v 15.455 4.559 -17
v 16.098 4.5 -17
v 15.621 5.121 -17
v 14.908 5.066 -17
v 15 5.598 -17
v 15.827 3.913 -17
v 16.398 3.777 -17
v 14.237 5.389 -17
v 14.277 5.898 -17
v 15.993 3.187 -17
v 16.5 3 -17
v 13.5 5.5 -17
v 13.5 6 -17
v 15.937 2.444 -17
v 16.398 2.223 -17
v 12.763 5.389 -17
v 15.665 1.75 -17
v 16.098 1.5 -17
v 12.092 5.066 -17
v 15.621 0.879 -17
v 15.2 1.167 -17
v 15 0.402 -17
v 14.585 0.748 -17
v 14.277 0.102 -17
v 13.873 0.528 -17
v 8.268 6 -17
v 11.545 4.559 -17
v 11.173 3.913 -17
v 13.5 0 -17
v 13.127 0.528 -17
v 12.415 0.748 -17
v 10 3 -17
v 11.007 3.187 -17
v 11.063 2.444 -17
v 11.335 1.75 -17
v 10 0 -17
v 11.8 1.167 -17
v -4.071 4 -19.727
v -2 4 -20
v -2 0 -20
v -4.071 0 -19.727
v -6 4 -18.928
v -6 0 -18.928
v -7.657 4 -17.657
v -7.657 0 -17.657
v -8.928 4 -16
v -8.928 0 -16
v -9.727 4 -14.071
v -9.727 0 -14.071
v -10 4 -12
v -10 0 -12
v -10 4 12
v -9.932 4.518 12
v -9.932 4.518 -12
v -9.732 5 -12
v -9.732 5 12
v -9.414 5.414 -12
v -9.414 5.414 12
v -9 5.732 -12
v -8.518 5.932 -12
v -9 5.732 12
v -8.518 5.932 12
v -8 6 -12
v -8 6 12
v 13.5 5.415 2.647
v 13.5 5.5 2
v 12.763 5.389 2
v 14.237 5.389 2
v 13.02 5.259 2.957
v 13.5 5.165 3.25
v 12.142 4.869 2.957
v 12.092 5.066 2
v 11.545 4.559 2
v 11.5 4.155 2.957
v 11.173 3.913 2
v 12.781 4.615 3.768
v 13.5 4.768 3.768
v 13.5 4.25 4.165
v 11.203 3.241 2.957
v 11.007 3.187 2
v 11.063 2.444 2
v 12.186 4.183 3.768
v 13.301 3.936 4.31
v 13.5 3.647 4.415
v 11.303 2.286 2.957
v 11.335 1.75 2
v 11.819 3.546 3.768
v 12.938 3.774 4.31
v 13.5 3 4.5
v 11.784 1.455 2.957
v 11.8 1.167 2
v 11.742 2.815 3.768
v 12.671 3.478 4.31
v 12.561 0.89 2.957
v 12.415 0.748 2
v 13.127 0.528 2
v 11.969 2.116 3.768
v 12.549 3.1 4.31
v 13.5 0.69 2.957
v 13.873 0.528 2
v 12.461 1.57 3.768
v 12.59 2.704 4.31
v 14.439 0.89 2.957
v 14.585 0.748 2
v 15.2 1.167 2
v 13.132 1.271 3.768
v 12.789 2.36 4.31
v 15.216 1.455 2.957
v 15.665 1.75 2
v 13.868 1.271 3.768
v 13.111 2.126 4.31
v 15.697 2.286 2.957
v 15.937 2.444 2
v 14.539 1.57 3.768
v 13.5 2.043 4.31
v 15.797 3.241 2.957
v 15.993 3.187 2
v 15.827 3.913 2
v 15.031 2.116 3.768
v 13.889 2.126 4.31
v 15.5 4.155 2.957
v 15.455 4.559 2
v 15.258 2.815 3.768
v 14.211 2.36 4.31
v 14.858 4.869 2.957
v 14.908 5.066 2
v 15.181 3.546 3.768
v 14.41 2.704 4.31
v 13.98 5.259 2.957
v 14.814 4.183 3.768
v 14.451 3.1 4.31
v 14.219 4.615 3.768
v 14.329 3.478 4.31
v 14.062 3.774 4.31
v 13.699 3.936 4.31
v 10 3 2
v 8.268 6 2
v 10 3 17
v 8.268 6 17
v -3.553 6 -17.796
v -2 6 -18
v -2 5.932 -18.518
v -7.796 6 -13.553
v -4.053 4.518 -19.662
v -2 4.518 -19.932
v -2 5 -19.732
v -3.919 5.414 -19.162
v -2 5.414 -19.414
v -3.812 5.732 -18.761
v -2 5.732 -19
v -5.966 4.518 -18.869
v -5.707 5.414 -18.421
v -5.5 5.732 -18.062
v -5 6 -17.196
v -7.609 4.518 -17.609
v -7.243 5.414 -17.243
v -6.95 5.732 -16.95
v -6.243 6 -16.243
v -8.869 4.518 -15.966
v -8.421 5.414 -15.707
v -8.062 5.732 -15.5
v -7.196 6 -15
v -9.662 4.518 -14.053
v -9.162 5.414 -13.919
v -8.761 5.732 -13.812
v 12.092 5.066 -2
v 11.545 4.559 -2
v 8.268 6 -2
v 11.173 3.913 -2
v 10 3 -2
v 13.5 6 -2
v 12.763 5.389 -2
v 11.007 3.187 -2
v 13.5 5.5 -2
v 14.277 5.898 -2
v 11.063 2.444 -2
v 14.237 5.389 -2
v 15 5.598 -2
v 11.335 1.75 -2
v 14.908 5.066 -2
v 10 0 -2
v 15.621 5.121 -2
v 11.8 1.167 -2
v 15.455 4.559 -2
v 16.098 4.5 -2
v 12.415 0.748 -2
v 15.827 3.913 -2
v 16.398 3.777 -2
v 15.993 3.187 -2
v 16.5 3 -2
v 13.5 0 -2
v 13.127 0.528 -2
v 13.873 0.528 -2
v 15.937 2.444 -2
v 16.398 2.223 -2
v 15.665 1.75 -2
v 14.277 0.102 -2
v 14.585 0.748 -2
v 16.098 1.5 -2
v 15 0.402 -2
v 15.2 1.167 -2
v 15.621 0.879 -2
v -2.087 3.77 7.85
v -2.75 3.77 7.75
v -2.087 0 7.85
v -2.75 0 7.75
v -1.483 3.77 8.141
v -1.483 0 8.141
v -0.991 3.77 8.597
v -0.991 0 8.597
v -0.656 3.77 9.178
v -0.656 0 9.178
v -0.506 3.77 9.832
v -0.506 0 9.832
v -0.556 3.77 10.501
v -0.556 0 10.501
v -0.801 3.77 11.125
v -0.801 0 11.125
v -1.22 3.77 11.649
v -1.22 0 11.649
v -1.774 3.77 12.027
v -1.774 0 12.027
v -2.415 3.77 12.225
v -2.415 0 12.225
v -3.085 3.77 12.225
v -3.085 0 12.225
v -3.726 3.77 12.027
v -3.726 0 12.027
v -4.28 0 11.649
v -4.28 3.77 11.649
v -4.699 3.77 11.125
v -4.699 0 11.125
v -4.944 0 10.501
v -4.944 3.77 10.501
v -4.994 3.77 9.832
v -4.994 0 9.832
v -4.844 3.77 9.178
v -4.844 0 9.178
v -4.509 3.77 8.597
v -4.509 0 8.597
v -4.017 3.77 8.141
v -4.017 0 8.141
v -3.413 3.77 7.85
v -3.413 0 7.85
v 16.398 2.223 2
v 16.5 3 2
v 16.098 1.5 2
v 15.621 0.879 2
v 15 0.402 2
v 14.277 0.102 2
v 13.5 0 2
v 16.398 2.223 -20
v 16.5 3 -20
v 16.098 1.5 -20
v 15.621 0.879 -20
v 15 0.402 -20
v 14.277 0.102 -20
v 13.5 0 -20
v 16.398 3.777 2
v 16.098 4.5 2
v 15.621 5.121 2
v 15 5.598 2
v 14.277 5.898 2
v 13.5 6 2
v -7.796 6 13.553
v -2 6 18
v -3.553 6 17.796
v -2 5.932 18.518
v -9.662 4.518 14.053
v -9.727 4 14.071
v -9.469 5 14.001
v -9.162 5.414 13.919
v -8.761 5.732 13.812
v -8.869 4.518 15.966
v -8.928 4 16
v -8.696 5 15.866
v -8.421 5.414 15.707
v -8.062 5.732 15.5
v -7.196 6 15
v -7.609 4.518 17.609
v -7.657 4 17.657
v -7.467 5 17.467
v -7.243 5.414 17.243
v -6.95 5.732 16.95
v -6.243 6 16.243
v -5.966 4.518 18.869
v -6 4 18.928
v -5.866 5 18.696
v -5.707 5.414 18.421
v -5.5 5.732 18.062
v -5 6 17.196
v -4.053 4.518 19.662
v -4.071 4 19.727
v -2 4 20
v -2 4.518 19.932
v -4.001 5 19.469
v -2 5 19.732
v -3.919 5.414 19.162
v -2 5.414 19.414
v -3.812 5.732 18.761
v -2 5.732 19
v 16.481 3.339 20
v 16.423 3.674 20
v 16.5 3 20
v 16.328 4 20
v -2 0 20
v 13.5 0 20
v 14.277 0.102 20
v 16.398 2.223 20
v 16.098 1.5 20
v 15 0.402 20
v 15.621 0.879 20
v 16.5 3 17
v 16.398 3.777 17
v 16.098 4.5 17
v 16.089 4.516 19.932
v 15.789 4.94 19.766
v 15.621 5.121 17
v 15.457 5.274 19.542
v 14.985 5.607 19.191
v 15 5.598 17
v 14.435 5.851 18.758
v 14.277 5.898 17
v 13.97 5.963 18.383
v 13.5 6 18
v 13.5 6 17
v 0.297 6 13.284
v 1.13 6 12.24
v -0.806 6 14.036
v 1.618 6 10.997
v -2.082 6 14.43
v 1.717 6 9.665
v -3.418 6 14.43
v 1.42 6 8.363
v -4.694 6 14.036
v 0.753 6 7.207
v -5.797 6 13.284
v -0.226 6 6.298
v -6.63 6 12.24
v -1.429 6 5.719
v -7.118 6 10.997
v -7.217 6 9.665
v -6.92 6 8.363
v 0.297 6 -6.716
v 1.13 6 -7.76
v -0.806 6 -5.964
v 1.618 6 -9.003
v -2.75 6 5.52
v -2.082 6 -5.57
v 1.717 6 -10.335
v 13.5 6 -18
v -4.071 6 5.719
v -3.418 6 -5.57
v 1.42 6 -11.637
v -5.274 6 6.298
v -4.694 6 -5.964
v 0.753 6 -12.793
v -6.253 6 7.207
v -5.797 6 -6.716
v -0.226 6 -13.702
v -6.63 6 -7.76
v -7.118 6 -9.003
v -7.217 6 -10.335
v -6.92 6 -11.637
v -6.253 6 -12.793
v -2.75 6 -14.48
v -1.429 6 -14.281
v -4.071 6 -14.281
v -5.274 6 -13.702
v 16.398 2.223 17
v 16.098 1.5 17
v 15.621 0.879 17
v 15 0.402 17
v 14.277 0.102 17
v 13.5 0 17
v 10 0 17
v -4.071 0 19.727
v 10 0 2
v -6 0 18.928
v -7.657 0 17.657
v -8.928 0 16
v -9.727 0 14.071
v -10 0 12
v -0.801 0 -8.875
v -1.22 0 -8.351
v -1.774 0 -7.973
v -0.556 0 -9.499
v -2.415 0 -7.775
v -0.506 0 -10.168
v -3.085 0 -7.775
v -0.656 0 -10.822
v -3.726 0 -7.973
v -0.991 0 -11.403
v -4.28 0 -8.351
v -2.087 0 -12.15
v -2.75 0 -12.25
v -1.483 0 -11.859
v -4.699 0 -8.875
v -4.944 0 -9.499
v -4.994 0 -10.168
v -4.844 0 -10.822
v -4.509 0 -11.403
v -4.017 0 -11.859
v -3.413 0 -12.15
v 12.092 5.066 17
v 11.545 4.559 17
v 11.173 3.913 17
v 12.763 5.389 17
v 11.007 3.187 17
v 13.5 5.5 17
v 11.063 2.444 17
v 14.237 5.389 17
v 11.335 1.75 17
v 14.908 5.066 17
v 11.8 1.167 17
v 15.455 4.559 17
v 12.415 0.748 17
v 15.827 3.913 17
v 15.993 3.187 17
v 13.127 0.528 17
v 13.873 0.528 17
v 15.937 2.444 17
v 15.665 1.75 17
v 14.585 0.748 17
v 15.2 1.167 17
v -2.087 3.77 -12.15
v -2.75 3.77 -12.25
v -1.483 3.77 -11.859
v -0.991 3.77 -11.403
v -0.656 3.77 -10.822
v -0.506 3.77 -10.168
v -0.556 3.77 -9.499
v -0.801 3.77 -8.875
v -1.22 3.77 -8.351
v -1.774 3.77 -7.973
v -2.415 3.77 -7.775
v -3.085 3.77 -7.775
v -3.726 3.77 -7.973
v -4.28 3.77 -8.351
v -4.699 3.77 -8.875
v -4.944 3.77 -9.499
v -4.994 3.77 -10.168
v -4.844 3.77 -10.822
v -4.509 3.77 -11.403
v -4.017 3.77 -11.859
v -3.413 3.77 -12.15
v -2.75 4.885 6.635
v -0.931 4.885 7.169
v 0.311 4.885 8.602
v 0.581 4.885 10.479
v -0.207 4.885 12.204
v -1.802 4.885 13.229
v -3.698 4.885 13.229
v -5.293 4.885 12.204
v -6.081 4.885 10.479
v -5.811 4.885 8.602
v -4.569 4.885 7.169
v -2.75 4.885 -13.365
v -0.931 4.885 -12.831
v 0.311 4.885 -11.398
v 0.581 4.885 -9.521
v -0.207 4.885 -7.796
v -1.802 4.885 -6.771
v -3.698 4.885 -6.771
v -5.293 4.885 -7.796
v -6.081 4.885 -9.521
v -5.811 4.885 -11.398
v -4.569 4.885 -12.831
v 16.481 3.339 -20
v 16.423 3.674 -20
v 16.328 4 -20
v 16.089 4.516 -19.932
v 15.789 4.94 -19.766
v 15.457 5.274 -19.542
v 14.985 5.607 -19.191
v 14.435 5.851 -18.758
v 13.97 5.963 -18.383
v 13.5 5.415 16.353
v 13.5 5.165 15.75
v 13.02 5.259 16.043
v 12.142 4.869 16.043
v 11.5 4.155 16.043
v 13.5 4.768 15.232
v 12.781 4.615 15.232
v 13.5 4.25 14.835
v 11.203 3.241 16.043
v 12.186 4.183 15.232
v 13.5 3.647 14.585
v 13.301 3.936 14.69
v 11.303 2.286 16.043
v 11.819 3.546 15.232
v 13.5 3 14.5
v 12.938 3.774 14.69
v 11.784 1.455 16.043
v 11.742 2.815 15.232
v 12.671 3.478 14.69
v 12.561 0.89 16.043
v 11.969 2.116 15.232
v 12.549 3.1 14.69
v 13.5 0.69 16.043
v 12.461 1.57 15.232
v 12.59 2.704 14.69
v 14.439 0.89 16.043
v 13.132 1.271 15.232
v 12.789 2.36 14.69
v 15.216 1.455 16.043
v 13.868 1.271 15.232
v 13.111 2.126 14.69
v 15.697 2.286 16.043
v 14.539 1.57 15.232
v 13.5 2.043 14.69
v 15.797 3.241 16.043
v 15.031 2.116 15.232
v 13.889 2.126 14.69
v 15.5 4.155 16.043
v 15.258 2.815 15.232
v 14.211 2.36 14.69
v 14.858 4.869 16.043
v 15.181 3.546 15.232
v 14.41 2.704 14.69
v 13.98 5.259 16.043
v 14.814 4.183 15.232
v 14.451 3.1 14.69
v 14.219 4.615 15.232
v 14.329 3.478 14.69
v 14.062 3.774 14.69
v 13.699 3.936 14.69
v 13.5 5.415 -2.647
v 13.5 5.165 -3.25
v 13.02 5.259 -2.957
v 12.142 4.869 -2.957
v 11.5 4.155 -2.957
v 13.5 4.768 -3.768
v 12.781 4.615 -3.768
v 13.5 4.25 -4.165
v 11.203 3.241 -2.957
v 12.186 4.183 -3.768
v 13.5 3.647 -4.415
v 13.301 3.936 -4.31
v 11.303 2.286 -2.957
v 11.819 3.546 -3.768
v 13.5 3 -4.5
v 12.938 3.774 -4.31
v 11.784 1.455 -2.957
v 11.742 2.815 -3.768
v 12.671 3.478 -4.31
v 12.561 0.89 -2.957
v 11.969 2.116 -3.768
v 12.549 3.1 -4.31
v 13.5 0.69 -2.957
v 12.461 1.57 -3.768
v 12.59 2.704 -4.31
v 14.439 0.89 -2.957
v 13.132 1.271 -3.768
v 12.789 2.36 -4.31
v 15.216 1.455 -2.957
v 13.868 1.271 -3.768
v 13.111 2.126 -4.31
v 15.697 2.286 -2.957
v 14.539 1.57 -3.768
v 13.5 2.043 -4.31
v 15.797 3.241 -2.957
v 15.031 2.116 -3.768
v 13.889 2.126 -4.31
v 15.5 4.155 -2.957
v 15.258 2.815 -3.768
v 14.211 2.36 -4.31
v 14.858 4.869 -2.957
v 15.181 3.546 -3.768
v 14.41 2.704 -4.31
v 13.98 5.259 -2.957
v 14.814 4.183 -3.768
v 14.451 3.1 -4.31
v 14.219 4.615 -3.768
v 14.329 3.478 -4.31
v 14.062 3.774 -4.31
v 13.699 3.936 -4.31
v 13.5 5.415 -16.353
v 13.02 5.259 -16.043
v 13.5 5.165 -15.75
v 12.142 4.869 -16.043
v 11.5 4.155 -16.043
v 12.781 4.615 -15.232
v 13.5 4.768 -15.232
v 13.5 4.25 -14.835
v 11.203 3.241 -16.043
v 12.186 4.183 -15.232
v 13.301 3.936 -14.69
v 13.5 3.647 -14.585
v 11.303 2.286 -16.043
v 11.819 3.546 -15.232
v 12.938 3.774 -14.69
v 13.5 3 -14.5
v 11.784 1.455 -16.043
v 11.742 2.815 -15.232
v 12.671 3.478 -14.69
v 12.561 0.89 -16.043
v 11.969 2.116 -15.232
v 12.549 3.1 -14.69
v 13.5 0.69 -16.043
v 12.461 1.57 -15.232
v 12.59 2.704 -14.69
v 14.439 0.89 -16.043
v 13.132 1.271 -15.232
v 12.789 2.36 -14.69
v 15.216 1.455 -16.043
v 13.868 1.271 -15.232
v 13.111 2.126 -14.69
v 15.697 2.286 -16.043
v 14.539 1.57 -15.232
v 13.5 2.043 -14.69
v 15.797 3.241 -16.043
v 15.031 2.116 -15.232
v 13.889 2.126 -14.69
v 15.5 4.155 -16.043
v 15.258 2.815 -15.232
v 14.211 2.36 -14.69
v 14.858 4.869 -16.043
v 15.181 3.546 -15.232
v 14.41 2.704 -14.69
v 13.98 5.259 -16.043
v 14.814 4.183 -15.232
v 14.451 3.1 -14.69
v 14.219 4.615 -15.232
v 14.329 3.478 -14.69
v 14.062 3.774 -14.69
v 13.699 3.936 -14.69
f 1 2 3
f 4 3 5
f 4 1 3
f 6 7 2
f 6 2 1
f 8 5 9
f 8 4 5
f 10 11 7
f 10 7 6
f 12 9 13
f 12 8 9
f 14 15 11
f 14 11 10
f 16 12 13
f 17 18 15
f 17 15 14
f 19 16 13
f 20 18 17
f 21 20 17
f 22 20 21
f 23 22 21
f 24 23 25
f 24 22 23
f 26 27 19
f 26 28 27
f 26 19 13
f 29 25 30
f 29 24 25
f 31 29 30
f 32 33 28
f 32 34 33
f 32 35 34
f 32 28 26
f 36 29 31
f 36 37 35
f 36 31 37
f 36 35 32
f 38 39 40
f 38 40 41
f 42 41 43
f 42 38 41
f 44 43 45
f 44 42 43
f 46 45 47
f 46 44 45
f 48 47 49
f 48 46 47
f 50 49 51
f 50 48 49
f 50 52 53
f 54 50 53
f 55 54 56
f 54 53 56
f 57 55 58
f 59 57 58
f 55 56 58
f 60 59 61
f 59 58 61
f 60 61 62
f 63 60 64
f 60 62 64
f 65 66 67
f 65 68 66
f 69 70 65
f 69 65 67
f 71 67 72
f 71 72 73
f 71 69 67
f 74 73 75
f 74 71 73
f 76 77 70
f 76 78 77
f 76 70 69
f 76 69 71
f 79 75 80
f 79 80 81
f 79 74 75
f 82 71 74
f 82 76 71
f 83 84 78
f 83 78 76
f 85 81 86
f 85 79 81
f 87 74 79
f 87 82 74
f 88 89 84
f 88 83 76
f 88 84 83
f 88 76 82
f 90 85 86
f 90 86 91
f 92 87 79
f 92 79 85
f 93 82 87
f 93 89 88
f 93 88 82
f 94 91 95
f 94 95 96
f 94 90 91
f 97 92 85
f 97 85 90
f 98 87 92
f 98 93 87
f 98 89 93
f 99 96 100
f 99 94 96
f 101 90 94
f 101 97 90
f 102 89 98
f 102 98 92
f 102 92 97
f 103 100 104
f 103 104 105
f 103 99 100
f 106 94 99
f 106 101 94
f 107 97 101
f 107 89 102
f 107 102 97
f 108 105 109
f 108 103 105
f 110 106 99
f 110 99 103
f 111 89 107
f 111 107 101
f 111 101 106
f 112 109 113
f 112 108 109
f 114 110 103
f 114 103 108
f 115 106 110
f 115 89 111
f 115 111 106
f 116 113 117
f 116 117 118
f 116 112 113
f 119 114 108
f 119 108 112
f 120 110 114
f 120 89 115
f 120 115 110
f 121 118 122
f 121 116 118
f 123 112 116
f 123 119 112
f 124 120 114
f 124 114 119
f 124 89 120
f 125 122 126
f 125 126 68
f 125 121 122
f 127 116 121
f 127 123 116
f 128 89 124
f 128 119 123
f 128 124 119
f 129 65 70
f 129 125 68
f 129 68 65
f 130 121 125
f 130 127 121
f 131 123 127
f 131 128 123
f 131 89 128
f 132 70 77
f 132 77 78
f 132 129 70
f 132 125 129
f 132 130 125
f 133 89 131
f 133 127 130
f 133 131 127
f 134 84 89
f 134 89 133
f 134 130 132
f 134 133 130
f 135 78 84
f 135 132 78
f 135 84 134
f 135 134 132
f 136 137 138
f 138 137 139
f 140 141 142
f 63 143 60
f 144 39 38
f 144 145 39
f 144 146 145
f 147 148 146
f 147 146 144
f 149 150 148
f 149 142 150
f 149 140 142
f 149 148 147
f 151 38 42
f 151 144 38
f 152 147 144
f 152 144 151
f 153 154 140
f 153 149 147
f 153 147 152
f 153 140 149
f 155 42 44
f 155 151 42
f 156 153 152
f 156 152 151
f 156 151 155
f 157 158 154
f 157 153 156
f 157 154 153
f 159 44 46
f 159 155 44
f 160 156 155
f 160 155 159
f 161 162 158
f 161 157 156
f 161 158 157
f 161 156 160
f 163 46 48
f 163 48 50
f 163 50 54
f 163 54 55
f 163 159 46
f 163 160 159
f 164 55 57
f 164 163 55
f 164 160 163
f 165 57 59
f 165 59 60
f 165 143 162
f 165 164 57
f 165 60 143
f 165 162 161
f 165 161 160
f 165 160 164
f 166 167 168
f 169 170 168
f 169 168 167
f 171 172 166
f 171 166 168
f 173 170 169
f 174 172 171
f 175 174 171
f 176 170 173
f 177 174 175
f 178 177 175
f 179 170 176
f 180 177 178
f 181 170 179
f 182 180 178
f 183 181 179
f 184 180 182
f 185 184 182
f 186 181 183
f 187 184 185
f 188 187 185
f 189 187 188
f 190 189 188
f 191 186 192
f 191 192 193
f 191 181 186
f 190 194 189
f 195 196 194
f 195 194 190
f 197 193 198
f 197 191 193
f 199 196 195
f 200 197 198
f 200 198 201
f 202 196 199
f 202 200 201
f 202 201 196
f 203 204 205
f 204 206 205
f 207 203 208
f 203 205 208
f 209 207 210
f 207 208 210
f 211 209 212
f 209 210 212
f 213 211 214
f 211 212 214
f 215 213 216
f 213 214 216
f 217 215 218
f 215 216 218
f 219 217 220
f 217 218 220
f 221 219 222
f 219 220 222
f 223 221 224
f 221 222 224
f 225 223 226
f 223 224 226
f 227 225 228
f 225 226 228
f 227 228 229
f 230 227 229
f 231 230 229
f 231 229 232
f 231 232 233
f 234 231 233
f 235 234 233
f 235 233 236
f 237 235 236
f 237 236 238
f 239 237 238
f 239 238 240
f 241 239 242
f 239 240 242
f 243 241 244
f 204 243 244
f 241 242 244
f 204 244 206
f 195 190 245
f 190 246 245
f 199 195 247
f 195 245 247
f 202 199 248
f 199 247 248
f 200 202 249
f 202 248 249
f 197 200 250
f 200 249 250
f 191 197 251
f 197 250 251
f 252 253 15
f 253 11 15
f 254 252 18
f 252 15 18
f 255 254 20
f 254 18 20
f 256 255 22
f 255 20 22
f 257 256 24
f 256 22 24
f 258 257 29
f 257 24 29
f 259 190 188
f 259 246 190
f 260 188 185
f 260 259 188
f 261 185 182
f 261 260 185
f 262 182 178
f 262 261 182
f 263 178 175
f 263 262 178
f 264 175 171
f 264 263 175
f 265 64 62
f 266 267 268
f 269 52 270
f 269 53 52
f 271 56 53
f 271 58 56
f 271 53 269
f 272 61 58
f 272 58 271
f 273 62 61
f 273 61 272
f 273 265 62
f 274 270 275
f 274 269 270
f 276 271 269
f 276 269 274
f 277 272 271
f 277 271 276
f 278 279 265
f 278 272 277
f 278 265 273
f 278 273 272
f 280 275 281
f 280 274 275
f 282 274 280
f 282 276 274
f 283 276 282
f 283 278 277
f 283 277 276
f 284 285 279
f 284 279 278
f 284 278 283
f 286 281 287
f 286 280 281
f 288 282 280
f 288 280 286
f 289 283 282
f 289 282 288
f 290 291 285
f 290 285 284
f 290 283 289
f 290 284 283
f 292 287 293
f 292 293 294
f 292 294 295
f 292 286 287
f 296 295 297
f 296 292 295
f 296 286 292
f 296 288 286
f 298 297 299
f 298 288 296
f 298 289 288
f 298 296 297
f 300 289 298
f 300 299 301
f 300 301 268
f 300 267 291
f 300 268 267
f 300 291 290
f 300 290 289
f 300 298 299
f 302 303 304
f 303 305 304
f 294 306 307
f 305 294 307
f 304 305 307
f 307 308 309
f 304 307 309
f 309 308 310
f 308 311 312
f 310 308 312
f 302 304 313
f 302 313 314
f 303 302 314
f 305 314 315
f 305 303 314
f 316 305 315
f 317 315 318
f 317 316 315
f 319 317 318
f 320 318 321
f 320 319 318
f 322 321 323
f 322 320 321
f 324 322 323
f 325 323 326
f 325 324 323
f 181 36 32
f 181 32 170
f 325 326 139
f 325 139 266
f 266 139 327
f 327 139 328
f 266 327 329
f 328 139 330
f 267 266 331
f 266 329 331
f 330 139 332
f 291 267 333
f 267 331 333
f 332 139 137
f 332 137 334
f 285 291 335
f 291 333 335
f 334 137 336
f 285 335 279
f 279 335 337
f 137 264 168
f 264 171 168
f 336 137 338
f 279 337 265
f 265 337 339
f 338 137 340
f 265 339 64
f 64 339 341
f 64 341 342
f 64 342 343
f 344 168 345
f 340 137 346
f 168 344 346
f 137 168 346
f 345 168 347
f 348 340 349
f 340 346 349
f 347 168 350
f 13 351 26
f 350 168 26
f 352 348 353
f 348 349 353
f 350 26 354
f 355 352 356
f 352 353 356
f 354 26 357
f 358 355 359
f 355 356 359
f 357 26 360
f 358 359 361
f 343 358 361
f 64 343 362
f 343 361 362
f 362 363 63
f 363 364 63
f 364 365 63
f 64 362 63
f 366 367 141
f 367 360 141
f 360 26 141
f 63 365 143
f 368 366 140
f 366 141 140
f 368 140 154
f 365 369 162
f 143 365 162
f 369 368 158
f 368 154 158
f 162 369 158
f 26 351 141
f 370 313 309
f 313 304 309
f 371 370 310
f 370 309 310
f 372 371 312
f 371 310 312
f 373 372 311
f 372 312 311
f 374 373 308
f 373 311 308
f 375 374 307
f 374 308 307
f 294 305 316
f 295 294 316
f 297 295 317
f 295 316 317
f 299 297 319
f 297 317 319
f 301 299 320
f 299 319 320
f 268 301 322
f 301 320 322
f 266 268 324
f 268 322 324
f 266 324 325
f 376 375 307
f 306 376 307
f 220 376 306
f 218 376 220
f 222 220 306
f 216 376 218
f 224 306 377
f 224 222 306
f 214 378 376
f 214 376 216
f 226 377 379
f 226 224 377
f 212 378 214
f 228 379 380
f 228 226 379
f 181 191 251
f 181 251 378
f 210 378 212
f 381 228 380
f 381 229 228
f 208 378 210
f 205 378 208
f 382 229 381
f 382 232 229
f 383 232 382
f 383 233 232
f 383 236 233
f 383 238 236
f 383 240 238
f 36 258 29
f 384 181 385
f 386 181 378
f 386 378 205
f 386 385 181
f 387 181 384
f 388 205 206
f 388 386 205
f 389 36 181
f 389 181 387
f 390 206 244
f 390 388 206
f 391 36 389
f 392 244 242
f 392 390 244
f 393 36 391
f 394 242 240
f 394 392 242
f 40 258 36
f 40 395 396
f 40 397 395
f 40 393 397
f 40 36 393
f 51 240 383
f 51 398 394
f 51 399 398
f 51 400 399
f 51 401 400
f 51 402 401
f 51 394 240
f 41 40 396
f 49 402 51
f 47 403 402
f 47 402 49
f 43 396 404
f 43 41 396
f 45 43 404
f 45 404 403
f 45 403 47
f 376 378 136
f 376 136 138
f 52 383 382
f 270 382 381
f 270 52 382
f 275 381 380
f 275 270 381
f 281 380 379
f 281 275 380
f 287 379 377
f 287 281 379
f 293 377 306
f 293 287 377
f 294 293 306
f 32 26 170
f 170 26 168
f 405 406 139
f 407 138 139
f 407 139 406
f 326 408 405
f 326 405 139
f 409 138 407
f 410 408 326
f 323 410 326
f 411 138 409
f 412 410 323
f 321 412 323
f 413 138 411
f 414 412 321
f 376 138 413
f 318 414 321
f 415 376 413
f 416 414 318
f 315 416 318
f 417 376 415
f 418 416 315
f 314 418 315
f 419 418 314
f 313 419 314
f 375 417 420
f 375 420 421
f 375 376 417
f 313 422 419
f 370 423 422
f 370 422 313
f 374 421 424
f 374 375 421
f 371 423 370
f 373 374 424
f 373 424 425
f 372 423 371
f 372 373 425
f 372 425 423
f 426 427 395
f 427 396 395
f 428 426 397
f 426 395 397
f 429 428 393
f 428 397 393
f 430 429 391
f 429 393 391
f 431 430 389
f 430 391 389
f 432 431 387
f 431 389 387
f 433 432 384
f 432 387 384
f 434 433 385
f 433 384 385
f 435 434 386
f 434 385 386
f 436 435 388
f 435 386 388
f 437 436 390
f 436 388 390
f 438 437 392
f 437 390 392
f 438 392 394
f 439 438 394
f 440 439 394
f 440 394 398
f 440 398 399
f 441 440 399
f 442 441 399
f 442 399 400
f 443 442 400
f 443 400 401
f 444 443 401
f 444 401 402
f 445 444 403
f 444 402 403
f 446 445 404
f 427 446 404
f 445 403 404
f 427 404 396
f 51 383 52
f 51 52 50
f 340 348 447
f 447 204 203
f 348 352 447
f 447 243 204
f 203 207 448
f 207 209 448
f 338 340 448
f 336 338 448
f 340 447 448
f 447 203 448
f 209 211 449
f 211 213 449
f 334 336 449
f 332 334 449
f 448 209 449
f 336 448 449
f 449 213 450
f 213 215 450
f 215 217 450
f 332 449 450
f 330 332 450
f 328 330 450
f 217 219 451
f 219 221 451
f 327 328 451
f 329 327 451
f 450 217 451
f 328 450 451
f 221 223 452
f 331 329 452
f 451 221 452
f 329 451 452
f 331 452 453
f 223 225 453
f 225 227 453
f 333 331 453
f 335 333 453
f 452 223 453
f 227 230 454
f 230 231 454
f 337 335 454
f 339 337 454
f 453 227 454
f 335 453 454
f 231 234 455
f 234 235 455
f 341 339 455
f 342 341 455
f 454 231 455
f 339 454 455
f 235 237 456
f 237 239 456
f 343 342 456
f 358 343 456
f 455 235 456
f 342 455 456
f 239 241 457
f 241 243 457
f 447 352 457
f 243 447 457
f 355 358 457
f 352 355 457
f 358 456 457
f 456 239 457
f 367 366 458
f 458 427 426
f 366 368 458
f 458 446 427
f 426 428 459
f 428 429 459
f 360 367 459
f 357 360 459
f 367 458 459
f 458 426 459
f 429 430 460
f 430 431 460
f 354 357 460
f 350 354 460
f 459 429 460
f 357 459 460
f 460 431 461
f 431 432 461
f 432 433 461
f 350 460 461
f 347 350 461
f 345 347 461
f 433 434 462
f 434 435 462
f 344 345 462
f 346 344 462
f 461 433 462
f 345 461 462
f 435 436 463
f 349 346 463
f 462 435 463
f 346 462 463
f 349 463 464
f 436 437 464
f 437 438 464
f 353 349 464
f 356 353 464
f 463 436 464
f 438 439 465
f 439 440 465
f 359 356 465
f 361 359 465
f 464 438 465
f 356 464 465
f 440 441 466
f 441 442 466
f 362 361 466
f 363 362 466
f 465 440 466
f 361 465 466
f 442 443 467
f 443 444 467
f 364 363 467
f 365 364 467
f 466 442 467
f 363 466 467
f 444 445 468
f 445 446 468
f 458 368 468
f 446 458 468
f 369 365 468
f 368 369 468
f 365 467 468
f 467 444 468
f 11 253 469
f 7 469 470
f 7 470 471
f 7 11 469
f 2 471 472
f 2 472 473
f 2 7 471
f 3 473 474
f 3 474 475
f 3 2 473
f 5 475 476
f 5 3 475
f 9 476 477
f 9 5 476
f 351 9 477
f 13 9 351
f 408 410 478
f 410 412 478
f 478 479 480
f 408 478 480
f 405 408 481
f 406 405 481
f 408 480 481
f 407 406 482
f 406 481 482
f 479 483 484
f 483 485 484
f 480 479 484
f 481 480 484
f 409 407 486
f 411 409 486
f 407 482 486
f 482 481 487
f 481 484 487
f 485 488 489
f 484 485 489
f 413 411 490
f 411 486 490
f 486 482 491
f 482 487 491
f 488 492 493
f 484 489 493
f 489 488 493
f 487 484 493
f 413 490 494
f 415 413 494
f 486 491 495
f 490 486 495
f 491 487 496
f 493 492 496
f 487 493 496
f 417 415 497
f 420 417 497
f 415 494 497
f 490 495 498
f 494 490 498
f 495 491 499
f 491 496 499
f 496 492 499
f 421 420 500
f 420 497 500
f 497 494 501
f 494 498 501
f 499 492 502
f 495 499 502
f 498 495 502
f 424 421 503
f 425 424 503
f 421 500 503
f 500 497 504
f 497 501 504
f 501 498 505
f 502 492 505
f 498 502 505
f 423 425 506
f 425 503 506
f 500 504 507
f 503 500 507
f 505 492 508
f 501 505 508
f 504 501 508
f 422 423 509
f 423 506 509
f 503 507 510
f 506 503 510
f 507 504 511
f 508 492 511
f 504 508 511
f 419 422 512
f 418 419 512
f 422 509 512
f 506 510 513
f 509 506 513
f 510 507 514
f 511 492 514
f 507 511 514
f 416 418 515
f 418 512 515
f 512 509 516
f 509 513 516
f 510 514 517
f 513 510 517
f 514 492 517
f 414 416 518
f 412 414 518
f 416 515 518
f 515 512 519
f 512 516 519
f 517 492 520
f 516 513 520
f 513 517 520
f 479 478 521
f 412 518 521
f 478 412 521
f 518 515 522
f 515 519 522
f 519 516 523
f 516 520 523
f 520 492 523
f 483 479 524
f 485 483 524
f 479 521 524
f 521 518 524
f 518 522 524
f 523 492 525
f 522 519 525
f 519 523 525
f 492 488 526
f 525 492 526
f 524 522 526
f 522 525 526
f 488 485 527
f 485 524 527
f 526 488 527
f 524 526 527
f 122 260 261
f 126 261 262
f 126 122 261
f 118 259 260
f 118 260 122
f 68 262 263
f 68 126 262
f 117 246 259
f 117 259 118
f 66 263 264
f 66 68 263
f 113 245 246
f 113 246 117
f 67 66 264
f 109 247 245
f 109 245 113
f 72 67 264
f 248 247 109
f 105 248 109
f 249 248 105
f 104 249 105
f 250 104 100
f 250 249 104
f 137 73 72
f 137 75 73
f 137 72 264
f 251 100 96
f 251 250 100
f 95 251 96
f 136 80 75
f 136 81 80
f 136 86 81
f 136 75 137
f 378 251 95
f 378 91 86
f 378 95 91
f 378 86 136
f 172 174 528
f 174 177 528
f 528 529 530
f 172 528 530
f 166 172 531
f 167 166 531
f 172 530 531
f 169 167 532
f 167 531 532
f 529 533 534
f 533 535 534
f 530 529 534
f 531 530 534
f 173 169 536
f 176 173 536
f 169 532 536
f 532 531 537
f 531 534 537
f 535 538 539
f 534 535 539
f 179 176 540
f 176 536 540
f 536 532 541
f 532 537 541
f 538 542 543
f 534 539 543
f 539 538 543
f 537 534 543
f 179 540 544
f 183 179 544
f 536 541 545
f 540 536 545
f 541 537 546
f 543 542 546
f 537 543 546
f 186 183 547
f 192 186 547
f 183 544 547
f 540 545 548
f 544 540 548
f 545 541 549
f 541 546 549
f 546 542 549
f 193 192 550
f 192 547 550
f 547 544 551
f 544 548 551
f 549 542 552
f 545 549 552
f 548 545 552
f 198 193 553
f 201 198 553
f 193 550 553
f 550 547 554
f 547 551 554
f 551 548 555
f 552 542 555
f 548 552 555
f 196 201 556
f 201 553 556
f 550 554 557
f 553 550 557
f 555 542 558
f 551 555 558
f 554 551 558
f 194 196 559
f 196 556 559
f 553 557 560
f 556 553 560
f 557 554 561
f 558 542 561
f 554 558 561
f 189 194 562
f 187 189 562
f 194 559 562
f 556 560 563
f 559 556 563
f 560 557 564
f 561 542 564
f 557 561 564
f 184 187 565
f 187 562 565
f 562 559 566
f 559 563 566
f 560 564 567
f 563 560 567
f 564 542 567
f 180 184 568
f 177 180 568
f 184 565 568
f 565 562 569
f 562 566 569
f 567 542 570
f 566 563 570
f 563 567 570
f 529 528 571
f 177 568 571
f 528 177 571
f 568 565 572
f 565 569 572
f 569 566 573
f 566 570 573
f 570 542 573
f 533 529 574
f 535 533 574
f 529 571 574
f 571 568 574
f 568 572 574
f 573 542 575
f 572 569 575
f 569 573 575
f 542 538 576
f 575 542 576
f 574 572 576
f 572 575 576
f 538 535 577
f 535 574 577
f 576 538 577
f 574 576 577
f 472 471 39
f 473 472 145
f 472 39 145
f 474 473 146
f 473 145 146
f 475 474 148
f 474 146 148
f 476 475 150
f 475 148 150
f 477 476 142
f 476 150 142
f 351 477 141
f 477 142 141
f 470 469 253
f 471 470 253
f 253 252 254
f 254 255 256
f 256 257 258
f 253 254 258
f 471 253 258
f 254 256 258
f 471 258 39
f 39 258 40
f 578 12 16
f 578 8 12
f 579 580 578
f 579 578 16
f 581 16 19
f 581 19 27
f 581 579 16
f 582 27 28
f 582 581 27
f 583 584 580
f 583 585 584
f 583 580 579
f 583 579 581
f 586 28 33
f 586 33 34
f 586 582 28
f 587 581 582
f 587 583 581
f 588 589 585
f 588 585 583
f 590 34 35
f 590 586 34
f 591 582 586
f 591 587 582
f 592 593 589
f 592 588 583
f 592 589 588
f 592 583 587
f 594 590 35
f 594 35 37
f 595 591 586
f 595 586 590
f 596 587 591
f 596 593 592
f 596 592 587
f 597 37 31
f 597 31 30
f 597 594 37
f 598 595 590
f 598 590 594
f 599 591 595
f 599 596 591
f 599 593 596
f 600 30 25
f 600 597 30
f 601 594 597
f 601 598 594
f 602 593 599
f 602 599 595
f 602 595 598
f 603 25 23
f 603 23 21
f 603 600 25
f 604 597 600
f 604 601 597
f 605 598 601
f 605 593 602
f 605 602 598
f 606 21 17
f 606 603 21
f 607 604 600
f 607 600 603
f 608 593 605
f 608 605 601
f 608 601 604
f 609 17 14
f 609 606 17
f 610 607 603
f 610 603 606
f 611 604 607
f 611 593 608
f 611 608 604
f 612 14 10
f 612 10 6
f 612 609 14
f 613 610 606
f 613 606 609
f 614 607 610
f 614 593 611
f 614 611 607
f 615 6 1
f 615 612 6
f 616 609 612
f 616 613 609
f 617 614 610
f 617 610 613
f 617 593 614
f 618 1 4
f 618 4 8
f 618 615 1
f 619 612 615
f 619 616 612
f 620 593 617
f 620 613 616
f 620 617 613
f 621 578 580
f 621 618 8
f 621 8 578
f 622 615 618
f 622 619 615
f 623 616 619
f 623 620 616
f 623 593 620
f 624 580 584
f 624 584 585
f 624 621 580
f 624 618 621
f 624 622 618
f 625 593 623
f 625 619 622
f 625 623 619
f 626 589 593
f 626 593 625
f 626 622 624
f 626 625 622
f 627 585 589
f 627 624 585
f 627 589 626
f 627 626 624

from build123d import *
from OCP.BRepFilletAPI import BRepFilletAPI_MakeChamfer

# Parameters (mm, degrees)
BOSS_EXTRUDE1_DEPTH           = 6
FILLET1_R                     = 3
LPATTERN1_COUNT               = 2
LPATTERN1_PITCH               = 19
CSK_FOR_M4_SFHCS1_D           = 4.5
CSK_FOR_M4_SFHCS1_CSINK_D     = 8.96
CSK_FOR_M4_SFHCS1_CSINK_ANGLE = 90
FILLET2_R                     = 8
FILLET3_R                     = 2
CHAMFER1_SIZE                 = 3
CHAMFER1_SIZE2                = 1.732050808


# Some blends are built 0.0001 mm under size
with BuildPart() as part:
    # Sketch1 → Boss-Extrude1 (new body)
    with BuildSketch(Plane(origin=(0, 0, 0), x_dir=(1, 0, 0), z_dir=(0, 1, 0))):
        Polygon((10, 20), (16.5, 20), (16.5, 17), (10, 17), (10, 2), (16.5, 2), (16.5, -2), (10, -2), (10, -17), (16.5, -17), (16.5, -20), (10, -20), (-10, -20), (-10, 20), align=None)
    extrude(amount=BOSS_EXTRUDE1_DEPTH)

    # Fillet1
    fillet1_edges = [part.edges().sort_by_distance(p)[0] for p in [
        (16.5, 6, -18.5),
        (16.5, 0, -18.5),
        (16.5, 0, 0),
        (16.5, 0, 18.5),
        (16.5, 6, 0),
        (16.5, 6, 18.5),
    ]]
    fillet(fillet1_edges, radius=FILLET1_R - 0.0001)  # a hair under: the kernel refuses the full size

    # Sketch2 → Revolve1 (revolve)
    with BuildSketch(Plane(origin=(13.5, 0, 0), x_dir=(0, 0, -1), z_dir=(1, 0, 0))):
        with BuildLine():
            Line((-2, 3), (-2, 5.5))
            ThreePointArc((-2, 5.5), (-3.767766953, 4.767766953), (-4.5, 3))
            Line((-4.5, 3), (-2, 3))
        make_face()
    revolve1 = revolve(axis=Axis((13.5, 3, 2), (0, 0, 1)))

    # LPattern1: Revolve1 ×2
    with Locations(*[(0, 0, -i * LPATTERN1_PITCH) for i in range(1, LPATTERN1_COUNT)]):
        add(revolve1)

    # Mirror1: Revolve1 across plane
    add(revolve1.mirror(Plane.XY))

    # Mirror1 copy 1 sketch → Mirror1 copy 1 (revolve)
    with BuildSketch(Plane(origin=(13.5, 0, 19), x_dir=(0, 0, 1), z_dir=(1, 0, 0))):
        with BuildLine():
            Line((-2, -3), (-2, -5.5))
            ThreePointArc((-2, -5.5), (-3.767766953, -4.767766953), (-4.5, -3))
            Line((-4.5, -3), (-2, -3))
        make_face()
    revolve(axis=Axis((13.5, 3, 17), (0, 0, 1)))

    # CSK for M4 SFHCS1 (through all)
    with Locations(Plane(origin=(-2.75, 6, -10), x_dir=(0, 0, 1), z_dir=(0, 1, 0))):
        with Locations((0, 0), (20, 0)):
            CounterSinkHole(CSK_FOR_M4_SFHCS1_D / 2, CSK_FOR_M4_SFHCS1_CSINK_D / 2, counter_sink_angle=CSK_FOR_M4_SFHCS1_CSINK_ANGLE)

    # Fillet2
    fillet2_edges = [part.edges().sort_by_distance(p)[0] for p in [
        (-10, 3, -20),
        (-10, 3, 20),
    ]]
    fillet(fillet2_edges, radius=FILLET2_R)

    # Fillet3
    # the kernel refuses this fillet: 2 mm, written as the material it takes off along each edge
    with BuildSketch(Plane(origin=(18.5001, 6, 20), x_dir=(0, 0, -1), z_dir=(-1, 0, 0))) as fillet3_piece_1:
        with BuildLine():
            CenterArc((FILLET3_R, FILLET3_R), FILLET3_R, 180, 90)
            Line((0, FILLET3_R), (0, 0))
            Line((0, 0), (FILLET3_R, 0))
        make_face()
    extrude(amount=20.5001, mode=Mode.SUBTRACT)
    with BuildSketch(Plane(origin=(-2, 6, 12), x_dir=(-1, 0, 0), z_dir=(0, 0, -1))) as fillet3_piece_2:
        with BuildLine():
            CenterArc((8 - FILLET3_R, -FILLET3_R), FILLET3_R, 0, 90)
            Line((8, -FILLET3_R), (8, 0))
            Line((8, 0), (8 - FILLET3_R, 0))
        make_face()
    revolve(axis=Axis((-2, 6, 12), (0, 1, 0)), revolution_arc=90, mode=Mode.SUBTRACT)
    with BuildSketch(Plane(origin=(-2, 6, -12), x_dir=(0, 0, -1), z_dir=(1, 0, 0))) as fillet3_piece_3:
        with BuildLine():
            CenterArc((8 - FILLET3_R, -FILLET3_R), FILLET3_R, 0, 90)
            Line((8 - FILLET3_R, 0), (8, 0))
            Line((8, 0), (8, -FILLET3_R))
        make_face()
    revolve(axis=Axis((-2, 6, -12), (0, 1, 0)), revolution_arc=90, mode=Mode.SUBTRACT)
    with BuildSketch(Plane(origin=(-2, 6, -20), x_dir=(0, -1, 0), z_dir=(1, 0, 0))) as fillet3_piece_4:
        with BuildLine():
            CenterArc((FILLET3_R, -FILLET3_R), FILLET3_R, 90, 90)
            Line((0, -FILLET3_R), (0, 0))
            Line((0, 0), (FILLET3_R, 0))
        make_face()
    extrude(amount=20.5001, mode=Mode.SUBTRACT)
    with BuildSketch(Plane(origin=(-10, 6, 12), x_dir=(1, 0, 0), z_dir=(0, 0, -1))) as fillet3_piece_5:
        with BuildLine():
            CenterArc((FILLET3_R, FILLET3_R), FILLET3_R, 180, 90)
            Line((0, FILLET3_R), (0, 0))
            Line((0, 0), (FILLET3_R, 0))
        make_face()
    extrude(amount=24, mode=Mode.SUBTRACT)

    # Chamfer1: one chamfer whose edges measure the first distance from different faces: ONE call of the kernel's chamfer builder (chamfer() names one face for all edges)
    chamfer1_edges_1 = [part.edges().sort_by_distance(p)[0] for p in [
        (10, 6, 9.5),
    ]]
    chamfer1_side_1 = [part.faces().sort_by_distance(p)[0] for p in [
        (10, 3, 9.5),
    ]]
    chamfer1_edges_2 = [part.edges().sort_by_distance(p)[0] for p in [
        (10, 6, -9.5),
    ]]
    chamfer1_side_2 = [part.faces().sort_by_distance(p)[0] for p in [
        (10, 3, -9.5),
    ]]
    chamfer1 = BRepFilletAPI_MakeChamfer(part.part.solid().wrapped)
    for e in chamfer1_edges_1:
        chamfer1.Add(CHAMFER1_SIZE, CHAMFER1_SIZE2, e.wrapped, chamfer1_side_1[0].wrapped)  # the first distance lies on this face
    for e in chamfer1_edges_2:
        chamfer1.Add(CHAMFER1_SIZE, CHAMFER1_SIZE2, e.wrapped, chamfer1_side_2[0].wrapped)  # the first distance lies on this face
    add(Compound.cast(chamfer1.Shape()), mode=Mode.REPLACE)


solid = part.part
